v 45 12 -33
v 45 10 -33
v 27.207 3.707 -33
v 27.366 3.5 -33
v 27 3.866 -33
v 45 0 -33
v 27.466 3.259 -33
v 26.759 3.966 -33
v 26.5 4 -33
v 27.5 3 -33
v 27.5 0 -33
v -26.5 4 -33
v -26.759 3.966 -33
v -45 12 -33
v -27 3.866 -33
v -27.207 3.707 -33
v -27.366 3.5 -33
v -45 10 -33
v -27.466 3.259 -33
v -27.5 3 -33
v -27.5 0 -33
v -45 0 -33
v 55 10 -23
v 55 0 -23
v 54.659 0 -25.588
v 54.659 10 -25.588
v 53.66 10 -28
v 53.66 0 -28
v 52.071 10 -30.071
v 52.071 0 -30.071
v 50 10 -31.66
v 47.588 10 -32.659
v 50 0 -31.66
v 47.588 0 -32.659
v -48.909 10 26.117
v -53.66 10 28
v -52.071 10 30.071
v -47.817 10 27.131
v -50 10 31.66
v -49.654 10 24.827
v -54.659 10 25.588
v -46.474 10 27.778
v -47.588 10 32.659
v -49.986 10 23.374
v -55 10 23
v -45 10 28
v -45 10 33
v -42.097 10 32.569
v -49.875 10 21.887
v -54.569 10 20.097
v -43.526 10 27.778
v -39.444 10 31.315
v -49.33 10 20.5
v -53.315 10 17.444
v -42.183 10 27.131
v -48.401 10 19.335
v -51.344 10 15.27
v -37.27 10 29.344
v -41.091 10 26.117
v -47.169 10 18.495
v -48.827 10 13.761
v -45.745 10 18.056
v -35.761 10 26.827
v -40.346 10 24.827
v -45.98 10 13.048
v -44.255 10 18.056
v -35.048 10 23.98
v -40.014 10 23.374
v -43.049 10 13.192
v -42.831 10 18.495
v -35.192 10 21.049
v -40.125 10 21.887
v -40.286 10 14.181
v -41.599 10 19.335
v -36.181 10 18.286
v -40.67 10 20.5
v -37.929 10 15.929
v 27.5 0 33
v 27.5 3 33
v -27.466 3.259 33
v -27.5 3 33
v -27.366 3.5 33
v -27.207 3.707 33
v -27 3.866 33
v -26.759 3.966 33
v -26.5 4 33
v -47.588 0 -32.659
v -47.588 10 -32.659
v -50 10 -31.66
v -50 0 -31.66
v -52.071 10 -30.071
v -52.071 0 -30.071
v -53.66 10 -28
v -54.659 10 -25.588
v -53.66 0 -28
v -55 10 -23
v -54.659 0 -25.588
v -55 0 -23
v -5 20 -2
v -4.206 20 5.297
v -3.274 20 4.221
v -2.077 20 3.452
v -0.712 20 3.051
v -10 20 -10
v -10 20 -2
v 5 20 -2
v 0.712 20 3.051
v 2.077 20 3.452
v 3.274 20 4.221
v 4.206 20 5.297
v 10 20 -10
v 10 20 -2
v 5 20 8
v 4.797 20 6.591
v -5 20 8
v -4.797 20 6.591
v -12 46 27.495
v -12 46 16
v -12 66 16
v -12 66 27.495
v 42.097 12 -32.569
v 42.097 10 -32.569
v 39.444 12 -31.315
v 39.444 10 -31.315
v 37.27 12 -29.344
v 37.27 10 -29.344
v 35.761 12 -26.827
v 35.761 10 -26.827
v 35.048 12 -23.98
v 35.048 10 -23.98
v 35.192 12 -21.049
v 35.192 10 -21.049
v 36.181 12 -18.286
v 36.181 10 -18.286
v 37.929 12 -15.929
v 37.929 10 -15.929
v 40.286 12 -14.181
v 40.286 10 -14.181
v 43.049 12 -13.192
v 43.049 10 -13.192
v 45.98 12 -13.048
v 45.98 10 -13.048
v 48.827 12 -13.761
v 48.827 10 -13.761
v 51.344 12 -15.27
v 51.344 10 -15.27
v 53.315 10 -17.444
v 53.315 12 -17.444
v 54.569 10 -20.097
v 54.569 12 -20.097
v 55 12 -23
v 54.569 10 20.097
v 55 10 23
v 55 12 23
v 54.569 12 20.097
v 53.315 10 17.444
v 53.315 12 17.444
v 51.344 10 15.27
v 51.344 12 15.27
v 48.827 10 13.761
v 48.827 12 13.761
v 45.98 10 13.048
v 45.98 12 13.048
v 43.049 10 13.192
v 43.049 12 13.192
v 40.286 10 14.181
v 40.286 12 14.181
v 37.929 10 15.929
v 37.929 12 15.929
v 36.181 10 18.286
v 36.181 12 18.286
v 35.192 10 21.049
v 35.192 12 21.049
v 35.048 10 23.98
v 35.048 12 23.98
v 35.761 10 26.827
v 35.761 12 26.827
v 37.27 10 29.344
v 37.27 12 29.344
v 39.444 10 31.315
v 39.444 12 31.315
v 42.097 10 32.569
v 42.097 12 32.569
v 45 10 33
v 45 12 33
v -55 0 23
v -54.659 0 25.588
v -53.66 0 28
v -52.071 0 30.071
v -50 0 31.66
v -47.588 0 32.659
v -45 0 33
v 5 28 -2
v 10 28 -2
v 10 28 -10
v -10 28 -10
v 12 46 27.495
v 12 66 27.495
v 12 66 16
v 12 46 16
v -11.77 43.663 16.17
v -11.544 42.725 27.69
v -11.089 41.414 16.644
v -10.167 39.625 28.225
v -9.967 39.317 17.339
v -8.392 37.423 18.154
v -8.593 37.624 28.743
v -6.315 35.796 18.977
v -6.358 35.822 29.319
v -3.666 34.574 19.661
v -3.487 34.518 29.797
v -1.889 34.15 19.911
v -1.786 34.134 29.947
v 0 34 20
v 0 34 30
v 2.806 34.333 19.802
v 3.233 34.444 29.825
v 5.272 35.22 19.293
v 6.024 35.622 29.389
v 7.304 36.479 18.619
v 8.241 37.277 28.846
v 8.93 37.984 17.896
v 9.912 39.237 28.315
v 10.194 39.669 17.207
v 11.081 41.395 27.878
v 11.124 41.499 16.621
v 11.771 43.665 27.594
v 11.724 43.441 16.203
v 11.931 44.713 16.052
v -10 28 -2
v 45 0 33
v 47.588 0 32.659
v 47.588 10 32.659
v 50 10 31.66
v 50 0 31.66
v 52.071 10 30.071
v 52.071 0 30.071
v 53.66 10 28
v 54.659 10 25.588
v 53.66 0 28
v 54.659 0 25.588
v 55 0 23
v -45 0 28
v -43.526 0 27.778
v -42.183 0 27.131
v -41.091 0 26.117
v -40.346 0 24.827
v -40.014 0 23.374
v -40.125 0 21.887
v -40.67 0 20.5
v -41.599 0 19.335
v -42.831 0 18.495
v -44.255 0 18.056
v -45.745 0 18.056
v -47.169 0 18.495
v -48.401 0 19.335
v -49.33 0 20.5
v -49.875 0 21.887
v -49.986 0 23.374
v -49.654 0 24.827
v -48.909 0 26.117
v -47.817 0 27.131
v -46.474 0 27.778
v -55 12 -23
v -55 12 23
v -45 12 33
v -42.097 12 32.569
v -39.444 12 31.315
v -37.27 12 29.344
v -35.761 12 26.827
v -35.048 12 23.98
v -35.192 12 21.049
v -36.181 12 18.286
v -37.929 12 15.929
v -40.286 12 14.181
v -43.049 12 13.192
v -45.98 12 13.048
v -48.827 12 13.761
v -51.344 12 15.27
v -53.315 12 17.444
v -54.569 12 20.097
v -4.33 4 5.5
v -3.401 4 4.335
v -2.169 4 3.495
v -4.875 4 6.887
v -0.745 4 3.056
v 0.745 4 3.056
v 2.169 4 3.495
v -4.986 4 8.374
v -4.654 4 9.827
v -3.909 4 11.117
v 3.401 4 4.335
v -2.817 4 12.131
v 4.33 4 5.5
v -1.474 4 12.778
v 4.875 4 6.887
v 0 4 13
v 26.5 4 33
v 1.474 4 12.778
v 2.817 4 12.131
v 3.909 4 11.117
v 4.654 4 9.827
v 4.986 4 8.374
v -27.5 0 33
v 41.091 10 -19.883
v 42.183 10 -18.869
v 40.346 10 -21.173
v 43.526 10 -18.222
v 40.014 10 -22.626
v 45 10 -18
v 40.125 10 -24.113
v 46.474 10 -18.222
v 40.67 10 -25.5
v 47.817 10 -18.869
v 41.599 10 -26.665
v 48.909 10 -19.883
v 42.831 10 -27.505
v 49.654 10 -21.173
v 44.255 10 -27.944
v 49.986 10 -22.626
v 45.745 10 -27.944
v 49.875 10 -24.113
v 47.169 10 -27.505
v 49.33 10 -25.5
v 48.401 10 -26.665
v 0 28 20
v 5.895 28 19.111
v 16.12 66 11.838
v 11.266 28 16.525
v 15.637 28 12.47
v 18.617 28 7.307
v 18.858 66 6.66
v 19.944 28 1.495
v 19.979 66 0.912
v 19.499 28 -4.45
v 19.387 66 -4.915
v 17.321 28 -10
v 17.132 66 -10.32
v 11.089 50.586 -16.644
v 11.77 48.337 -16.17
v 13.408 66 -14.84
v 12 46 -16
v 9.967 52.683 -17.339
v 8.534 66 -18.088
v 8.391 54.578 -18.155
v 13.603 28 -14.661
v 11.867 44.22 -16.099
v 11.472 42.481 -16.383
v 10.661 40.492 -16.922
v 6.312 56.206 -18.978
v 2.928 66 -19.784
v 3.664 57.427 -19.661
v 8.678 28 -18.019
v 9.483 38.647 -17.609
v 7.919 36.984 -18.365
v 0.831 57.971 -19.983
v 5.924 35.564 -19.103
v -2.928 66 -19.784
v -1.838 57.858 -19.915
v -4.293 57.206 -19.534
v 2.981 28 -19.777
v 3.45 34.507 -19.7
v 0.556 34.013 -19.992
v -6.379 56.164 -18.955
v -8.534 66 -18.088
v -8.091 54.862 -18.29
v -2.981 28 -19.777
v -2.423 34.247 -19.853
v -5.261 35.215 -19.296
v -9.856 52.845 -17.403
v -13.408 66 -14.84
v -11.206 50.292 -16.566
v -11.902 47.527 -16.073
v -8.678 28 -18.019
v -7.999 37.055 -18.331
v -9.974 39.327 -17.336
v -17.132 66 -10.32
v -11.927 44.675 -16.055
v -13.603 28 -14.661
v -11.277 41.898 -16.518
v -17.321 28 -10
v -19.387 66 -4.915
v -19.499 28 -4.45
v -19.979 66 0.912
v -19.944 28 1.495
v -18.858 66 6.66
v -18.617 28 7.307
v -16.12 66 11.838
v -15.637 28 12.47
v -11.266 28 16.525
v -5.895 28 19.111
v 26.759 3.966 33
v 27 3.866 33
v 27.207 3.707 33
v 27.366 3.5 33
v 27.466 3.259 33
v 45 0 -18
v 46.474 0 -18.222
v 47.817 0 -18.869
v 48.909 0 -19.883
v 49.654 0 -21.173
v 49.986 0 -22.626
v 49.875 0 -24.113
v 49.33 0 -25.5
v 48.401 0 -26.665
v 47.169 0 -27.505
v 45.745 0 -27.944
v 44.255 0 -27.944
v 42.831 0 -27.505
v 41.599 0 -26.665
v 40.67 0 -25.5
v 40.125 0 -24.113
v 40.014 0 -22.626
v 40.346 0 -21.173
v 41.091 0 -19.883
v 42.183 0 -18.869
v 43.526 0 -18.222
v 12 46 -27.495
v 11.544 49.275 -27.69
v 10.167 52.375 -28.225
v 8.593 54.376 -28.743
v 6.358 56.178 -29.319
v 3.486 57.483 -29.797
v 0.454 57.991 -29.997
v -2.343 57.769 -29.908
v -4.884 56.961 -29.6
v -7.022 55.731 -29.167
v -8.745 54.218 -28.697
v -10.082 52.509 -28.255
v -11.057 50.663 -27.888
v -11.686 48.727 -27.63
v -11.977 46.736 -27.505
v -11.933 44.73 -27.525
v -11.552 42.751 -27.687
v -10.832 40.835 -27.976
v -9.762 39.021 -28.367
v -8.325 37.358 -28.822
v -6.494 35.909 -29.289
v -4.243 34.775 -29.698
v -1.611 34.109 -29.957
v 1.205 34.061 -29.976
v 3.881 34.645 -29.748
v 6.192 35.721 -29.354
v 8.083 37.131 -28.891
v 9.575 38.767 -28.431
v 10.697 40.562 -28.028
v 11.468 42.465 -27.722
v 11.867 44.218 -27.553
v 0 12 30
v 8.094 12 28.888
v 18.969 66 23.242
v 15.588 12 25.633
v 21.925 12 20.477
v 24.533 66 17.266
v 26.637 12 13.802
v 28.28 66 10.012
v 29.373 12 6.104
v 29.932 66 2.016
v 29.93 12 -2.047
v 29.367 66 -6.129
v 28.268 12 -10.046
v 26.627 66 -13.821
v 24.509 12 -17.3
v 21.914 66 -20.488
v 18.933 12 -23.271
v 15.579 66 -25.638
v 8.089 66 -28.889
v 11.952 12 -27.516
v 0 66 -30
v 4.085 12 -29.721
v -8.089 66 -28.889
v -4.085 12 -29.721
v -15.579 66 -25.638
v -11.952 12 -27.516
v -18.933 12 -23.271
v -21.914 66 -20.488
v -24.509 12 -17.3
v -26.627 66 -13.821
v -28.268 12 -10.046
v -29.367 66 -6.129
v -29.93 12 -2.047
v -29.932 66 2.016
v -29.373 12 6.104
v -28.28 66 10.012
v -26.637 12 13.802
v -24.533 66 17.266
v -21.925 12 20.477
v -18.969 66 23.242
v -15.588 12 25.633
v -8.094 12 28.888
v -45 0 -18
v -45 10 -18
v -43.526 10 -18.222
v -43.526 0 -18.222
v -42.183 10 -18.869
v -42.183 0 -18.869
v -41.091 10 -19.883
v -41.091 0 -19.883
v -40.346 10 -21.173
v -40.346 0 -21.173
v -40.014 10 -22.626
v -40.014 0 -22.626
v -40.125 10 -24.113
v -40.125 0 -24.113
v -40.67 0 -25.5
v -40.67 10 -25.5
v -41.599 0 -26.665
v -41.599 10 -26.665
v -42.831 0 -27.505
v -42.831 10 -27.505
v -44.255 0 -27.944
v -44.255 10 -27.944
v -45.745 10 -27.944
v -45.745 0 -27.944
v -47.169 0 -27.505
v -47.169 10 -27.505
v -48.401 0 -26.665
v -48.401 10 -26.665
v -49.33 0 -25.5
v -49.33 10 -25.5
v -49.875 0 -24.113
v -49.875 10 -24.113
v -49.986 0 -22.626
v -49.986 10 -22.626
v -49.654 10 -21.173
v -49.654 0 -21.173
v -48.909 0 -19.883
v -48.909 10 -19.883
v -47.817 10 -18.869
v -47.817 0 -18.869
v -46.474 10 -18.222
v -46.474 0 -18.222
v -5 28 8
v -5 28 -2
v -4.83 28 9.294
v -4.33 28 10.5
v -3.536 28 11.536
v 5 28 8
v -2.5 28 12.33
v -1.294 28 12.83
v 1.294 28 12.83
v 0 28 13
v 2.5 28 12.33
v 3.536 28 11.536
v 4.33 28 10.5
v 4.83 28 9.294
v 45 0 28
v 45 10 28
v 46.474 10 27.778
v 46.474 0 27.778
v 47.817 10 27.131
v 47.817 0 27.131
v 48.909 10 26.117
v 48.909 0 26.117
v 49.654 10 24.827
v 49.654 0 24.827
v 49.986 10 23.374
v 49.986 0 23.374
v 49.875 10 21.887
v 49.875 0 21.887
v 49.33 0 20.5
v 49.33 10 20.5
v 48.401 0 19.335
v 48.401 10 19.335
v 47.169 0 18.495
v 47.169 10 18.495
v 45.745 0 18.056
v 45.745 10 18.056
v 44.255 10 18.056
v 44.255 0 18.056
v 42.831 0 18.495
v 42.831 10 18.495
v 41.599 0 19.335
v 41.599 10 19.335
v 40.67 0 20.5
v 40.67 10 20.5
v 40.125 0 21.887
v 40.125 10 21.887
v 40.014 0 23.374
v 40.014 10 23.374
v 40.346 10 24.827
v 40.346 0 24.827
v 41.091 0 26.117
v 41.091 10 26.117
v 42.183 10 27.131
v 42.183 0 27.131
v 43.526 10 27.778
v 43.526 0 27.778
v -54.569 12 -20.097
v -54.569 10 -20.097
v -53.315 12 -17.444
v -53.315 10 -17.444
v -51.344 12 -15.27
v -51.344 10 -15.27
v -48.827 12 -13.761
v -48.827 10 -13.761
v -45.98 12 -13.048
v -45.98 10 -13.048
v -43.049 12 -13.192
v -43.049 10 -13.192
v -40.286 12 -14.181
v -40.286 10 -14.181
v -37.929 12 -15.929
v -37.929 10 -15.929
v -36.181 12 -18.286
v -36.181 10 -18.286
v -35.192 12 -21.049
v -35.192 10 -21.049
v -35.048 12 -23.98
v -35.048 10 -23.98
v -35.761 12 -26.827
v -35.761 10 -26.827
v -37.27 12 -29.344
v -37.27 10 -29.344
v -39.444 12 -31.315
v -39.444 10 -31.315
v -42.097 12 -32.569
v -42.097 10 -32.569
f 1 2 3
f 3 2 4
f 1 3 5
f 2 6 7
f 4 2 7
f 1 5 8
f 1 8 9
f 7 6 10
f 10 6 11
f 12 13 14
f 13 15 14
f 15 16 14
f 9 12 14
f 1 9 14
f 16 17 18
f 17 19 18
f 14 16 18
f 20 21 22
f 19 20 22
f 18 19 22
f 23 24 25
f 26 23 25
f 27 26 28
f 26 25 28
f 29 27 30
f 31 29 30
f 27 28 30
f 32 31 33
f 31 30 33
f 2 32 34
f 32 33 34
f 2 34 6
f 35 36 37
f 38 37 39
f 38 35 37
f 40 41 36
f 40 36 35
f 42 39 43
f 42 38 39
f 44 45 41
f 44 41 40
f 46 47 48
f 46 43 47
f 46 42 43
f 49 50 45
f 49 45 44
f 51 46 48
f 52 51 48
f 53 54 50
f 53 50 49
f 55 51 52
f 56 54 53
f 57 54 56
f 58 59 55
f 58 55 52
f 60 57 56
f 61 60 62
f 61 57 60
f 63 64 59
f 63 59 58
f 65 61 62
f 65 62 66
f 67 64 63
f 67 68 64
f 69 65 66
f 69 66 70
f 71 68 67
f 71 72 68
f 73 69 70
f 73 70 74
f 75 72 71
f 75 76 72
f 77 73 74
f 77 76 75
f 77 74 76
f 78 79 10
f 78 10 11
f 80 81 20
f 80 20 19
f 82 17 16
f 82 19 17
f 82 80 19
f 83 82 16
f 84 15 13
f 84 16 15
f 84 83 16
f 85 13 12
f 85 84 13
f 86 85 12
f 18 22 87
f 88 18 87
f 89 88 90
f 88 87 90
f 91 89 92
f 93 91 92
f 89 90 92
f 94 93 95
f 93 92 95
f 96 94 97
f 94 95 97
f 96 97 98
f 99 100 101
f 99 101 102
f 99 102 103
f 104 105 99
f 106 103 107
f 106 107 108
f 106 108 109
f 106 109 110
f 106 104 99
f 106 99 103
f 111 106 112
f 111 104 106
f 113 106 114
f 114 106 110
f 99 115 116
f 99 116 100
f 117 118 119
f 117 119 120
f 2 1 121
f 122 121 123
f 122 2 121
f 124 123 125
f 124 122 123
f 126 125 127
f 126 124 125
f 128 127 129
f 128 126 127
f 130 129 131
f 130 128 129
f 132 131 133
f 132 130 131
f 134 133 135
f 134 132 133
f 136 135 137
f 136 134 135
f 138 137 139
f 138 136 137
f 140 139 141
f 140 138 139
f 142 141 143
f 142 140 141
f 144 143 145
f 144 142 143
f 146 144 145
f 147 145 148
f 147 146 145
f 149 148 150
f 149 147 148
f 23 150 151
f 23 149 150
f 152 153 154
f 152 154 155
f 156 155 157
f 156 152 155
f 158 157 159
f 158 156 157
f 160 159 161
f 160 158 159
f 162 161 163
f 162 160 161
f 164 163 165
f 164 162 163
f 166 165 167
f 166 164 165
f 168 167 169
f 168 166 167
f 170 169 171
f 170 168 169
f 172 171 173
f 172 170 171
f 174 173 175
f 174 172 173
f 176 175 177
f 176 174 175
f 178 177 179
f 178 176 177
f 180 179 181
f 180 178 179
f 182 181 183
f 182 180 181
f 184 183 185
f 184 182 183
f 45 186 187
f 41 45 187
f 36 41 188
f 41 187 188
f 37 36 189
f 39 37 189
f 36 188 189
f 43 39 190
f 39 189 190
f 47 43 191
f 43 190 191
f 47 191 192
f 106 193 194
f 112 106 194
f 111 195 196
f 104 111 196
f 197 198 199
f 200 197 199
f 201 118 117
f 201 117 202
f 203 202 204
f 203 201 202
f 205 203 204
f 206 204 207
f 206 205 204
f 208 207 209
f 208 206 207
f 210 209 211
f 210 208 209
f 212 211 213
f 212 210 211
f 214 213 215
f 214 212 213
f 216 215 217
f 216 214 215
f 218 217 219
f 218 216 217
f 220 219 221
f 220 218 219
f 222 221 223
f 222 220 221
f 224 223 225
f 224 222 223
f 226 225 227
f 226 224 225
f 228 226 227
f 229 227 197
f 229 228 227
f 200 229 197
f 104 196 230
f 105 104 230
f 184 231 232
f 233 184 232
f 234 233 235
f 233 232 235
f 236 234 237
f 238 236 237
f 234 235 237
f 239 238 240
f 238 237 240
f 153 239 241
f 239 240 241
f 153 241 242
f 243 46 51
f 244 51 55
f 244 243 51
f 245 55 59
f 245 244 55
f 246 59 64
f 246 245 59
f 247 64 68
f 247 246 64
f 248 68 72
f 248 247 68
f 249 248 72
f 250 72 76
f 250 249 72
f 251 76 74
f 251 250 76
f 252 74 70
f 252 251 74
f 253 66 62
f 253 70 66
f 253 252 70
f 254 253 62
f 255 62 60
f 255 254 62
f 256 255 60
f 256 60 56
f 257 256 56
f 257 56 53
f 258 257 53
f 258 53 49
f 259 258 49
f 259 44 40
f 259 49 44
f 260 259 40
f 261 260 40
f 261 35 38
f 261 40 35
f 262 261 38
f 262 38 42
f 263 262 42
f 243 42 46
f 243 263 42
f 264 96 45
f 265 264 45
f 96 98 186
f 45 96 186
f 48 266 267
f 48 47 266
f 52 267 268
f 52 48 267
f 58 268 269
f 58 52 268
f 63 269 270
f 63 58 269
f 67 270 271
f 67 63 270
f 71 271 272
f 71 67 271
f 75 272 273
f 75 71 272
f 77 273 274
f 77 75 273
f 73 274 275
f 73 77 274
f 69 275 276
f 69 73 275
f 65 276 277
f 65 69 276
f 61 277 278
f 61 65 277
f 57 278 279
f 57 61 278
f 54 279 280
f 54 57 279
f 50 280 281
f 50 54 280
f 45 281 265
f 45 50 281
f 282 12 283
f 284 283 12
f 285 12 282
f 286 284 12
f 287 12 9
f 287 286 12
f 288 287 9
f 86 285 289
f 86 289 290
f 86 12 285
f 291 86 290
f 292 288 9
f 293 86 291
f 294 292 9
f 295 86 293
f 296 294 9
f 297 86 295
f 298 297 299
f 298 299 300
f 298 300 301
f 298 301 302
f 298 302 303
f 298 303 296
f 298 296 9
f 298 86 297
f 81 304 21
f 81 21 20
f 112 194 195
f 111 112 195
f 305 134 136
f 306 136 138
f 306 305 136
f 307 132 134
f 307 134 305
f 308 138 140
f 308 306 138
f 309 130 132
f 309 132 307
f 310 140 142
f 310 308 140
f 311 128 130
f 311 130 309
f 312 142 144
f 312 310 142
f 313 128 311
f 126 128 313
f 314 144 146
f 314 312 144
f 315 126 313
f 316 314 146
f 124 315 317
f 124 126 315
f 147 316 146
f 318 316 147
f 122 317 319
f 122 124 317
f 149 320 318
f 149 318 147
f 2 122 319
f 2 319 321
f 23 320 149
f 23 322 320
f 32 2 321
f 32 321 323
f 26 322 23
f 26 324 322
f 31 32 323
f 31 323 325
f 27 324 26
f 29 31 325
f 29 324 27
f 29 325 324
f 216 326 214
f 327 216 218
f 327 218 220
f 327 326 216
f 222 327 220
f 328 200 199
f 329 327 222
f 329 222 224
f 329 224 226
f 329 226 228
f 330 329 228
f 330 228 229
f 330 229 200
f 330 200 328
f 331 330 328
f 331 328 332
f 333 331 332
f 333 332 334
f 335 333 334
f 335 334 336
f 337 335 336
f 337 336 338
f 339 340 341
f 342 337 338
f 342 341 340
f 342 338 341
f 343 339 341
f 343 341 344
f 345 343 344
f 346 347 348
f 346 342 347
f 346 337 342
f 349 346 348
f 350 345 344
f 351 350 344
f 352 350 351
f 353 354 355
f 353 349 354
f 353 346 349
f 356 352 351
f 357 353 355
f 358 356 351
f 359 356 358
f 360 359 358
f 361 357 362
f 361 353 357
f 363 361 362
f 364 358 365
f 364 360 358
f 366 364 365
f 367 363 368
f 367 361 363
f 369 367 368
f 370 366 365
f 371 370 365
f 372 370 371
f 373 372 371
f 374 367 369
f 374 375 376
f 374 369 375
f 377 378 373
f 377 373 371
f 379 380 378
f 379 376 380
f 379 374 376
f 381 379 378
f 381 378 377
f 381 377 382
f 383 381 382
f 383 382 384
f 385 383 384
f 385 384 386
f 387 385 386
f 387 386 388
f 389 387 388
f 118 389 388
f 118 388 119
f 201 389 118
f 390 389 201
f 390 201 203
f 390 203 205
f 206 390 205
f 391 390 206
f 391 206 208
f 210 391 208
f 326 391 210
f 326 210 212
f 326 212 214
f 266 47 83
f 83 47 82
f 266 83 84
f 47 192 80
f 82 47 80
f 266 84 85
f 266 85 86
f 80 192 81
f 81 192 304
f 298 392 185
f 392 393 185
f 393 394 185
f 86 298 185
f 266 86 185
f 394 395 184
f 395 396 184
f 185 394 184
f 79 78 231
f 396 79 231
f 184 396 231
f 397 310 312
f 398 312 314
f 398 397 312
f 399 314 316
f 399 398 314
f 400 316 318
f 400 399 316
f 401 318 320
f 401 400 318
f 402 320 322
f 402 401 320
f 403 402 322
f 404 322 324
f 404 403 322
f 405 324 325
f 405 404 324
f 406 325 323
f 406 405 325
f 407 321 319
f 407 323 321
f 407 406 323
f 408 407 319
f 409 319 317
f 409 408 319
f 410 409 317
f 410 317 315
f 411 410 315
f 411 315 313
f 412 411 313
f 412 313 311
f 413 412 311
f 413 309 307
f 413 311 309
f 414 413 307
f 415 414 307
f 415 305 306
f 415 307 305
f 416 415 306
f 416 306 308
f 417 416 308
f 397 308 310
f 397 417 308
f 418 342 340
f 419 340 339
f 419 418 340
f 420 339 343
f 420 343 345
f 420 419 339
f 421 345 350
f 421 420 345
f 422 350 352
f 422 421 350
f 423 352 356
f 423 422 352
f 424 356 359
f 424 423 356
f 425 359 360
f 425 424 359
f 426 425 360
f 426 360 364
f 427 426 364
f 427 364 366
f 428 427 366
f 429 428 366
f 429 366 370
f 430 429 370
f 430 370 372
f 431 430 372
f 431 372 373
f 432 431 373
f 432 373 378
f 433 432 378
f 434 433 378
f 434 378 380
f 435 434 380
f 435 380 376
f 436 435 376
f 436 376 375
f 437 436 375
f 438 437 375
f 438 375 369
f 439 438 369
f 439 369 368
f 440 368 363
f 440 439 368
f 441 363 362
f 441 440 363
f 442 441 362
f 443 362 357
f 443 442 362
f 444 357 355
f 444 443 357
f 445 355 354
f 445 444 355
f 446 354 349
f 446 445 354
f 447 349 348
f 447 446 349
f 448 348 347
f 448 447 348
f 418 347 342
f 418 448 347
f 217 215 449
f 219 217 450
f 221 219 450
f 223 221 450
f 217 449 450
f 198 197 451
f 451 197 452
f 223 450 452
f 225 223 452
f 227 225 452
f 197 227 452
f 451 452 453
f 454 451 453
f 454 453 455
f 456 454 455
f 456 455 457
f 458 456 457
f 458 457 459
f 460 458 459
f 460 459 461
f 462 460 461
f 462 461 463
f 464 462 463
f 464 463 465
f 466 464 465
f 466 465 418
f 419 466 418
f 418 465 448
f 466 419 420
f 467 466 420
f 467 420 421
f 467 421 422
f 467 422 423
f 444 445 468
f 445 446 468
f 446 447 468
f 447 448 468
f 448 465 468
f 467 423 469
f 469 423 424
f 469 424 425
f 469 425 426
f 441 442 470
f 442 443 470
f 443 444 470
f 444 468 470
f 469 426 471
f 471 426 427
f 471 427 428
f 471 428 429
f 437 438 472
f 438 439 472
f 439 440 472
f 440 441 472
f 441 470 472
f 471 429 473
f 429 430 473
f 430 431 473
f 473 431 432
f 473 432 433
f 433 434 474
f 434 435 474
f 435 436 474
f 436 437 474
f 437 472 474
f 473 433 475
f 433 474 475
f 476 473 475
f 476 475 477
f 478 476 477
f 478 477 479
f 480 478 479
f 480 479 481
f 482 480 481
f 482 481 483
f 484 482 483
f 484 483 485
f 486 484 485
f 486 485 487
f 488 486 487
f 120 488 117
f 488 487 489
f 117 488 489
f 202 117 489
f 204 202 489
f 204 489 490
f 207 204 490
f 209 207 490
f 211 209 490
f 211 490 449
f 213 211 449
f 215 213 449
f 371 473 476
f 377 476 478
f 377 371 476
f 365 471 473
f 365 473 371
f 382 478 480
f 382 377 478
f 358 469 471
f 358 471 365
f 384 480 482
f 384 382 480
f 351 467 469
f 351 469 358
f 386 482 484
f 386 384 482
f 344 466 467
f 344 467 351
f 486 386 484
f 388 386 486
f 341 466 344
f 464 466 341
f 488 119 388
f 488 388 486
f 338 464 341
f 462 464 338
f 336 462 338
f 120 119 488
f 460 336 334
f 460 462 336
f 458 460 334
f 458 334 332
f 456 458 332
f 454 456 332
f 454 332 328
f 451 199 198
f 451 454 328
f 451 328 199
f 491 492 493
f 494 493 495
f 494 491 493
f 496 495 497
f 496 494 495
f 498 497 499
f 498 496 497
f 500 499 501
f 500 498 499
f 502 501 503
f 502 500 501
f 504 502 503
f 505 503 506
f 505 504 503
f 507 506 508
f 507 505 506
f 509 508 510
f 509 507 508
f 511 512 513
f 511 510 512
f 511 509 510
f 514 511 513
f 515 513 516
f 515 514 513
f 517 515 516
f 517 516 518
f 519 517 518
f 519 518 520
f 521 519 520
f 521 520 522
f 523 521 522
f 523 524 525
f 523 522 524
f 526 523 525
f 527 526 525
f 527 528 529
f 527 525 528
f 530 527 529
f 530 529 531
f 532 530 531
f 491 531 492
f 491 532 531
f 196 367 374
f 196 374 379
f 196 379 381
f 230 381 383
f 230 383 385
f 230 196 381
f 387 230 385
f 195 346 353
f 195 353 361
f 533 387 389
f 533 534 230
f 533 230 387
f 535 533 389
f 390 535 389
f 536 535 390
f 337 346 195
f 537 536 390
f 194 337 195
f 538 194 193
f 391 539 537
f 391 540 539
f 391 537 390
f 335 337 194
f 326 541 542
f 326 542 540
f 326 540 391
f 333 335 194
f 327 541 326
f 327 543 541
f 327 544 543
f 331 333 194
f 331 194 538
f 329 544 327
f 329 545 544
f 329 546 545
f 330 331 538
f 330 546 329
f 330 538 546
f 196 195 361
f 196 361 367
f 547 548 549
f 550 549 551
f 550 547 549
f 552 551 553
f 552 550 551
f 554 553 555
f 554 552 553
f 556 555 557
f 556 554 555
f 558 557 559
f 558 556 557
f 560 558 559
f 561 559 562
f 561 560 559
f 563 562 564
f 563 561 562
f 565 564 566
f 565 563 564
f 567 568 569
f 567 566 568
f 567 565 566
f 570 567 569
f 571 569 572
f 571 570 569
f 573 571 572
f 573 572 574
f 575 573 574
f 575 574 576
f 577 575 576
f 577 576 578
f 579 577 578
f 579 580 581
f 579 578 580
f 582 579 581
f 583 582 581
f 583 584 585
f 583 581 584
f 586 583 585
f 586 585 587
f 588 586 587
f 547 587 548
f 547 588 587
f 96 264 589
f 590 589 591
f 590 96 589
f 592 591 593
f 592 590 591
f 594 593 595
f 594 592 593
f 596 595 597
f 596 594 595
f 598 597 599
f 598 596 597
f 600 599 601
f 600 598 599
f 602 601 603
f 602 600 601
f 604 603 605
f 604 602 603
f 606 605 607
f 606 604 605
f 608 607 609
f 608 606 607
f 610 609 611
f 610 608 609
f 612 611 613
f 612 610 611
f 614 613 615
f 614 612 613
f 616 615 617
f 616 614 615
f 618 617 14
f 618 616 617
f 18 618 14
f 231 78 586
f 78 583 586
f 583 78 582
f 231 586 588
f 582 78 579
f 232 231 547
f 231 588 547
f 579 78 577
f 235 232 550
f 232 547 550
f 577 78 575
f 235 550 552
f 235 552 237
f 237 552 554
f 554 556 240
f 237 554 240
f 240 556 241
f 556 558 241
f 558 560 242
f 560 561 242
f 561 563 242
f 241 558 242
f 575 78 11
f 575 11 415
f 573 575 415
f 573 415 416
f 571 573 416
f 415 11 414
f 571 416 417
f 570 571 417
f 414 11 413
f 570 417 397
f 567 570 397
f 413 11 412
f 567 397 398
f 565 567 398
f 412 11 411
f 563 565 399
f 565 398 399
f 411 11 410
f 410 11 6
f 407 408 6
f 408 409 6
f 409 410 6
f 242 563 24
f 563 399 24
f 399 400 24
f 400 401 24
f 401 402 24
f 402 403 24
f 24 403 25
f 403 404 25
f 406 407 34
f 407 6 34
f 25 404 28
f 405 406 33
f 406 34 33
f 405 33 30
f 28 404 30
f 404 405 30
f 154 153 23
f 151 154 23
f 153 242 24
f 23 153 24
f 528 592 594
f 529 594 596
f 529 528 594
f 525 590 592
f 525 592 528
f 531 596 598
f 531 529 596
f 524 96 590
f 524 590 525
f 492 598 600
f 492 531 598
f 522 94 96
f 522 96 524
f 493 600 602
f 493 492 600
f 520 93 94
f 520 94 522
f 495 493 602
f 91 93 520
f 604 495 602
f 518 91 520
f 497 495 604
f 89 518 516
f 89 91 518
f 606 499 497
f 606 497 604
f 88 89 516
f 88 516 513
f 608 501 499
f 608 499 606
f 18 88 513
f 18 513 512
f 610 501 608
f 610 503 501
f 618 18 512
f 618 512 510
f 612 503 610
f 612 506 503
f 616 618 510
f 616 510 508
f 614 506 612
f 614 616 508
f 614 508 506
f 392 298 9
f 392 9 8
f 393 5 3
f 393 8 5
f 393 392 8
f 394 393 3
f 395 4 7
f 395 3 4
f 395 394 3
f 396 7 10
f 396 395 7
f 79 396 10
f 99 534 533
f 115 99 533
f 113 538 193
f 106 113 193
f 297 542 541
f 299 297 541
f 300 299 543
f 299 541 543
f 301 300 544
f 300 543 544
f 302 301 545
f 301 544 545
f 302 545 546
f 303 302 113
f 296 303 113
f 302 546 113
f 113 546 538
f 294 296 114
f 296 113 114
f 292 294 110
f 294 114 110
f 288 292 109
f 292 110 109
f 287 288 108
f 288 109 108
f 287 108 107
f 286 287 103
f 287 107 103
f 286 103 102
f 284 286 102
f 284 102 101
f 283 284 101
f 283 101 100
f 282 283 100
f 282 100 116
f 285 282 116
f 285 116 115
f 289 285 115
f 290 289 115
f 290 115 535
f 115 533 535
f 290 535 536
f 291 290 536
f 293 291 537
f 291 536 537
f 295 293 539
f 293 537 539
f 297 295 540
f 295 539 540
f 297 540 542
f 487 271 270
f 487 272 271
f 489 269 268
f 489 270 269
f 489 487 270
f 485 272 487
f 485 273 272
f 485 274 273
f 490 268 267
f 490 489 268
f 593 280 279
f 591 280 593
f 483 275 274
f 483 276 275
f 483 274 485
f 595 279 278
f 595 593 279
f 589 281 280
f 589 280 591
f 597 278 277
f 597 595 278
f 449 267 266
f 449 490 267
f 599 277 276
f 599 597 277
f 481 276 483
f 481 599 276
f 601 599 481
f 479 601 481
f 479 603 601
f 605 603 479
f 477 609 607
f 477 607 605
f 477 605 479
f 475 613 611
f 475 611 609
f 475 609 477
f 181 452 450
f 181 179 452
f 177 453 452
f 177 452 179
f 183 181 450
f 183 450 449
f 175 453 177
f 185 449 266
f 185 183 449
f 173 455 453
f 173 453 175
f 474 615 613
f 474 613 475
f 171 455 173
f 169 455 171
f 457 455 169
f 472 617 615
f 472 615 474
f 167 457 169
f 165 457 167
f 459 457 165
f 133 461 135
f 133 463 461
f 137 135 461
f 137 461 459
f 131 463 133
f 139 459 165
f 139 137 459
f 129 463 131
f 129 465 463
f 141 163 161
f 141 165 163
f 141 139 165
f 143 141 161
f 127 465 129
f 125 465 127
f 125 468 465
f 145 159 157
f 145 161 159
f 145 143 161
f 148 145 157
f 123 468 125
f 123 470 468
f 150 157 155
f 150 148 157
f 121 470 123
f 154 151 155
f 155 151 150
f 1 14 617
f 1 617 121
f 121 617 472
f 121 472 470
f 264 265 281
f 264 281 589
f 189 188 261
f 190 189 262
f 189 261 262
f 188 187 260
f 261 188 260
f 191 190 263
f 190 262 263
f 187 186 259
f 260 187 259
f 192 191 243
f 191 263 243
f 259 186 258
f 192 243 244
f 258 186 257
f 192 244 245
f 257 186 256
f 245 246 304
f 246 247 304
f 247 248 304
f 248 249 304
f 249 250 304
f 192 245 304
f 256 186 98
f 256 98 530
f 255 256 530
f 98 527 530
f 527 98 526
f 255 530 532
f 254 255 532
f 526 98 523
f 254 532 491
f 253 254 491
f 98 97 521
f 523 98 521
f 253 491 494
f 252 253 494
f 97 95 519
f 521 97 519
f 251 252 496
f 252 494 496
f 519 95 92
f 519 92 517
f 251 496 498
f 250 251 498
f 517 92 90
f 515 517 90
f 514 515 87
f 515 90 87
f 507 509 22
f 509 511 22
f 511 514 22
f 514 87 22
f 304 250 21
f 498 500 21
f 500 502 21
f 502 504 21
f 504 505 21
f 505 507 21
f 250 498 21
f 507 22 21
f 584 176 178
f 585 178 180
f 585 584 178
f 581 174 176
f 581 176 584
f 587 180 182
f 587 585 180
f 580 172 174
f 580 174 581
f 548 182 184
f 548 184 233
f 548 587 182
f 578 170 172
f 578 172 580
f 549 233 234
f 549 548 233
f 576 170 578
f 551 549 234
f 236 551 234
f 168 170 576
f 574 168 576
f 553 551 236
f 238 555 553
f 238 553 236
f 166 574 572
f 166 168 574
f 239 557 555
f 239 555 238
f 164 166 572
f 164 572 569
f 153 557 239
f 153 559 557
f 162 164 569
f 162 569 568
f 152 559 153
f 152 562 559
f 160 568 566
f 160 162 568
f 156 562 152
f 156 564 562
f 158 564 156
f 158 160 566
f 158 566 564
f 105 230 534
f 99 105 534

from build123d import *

# Parameters (mm, degrees)
SKETCH_1_R                      = 5
EXTRUDE_1_DEPTH                 = 12
CUT_EXTRUDE_START               = -2
SKETCH_3_R                      = 10
CUT_EXTRUDE_1_DEPTH             = 2
CUT_EXTRUDE_2_DEPTH             = 87.746757864
SKETCH_5_R                      = 30
SKETCH_5_R_2                    = 20
EXTRUDE_2_DEPTH                 = 54
SKETCH_6_R                      = 20
EXTRUDE_3_DEPTH                 = 16
CUT_EXTRUDE_4_DEPTH             = 8
SKETCH_7_3_R                    = 5
CUT_EXTRUDE_5_DEPTH             = 75.551995278
CUT_EXTRUDE_6_DEPTH             = 93.032602919
CUT_EXTRUDE_6_DEPTH_BACK        = 93.032602919
SKETCH_8_R                      = 12
CUT_EXTRUDE_7_REACH             = 94.033
CUT_EXTRUDE_7_END_RADIUS        = 12
CUT_EXTRUDE_7_DIRECTION_2_DEPTH = 93.032602919


with BuildPart() as part:
    # 草图1 → 凸台-拉伸1 (new body)
    with BuildSketch(Plane(origin=(0, 0, 0), x_dir=(1, 0, 0), z_dir=(0, 1, 0))):
        with BuildLine():
            Line((-45, -33), (45, -33))
            ThreePointArc((45, -33), (52.071067812, -30.071067812), (55, -23))
            Line((55, -23), (55, 23))
            ThreePointArc((55, 23), (52.071067812, 30.071067812), (45, 33))
            Line((45, 33), (-45, 33))
            ThreePointArc((-45, 33), (-52.071067812, 30.071067812), (-55, 23))
            Line((-55, 23), (-55, -23))
            ThreePointArc((-55, -23), (-52.071067812, -30.071067812), (-45, -33))
        make_face()
        with Locations(Location((-45, 23, 0), (0, 0, 270))):
            Circle(SKETCH_1_R, mode=Mode.SUBTRACT)
        with Locations(Location((45, 23, 0), (0, 0, 270))):
            Circle(SKETCH_1_R, mode=Mode.SUBTRACT)
        with Locations(Location((45, -23, 0), (0, 0, 270))):
            Circle(SKETCH_1_R, mode=Mode.SUBTRACT)
        with Locations(Location((-45, -23, 0), (0, 0, 270))):
            Circle(SKETCH_1_R, mode=Mode.SUBTRACT)
    extrude(amount=EXTRUDE_1_DEPTH)

    # 草图3 → 切除-拉伸1 (cut)
    with BuildSketch(Plane(origin=(0, 12, 0), x_dir=(1, 0, 0), z_dir=(0, 1, 0)).offset(CUT_EXTRUDE_START)):
        with Locations((-45, 23)):
            Circle(SKETCH_3_R)
        with Locations((-45, -23)):
            Circle(SKETCH_3_R)
        with Locations((45, -23)):
            Circle(SKETCH_3_R)
        with Locations((45, 23)):
            Circle(SKETCH_3_R)
    extrude(amount=CUT_EXTRUDE_1_DEPTH, mode=Mode.SUBTRACT)

    # 草图4 → 切除-拉伸2 (cut, through all)
    with BuildSketch(Plane.XY.offset(33)):
        with BuildLine():
            Line((-27.5, 0), (-27.5, 3))
            ThreePointArc((-27.5, 3), (-27.207106781, 3.707106781), (-26.5, 4))
            Line((-26.5, 4), (26.5, 4))
            ThreePointArc((26.5, 4), (27.207106781, 3.707106781), (27.5, 3))
            Line((27.5, 3), (27.5, 0))
            Line((27.5, 0), (-27.5, 0))
        make_face()
    extrude(amount=-CUT_EXTRUDE_2_DEPTH, mode=Mode.SUBTRACT)

    # 草图5 → 凸台-拉伸2 (add)
    with BuildSketch(Plane(origin=(0, 12, 0), x_dir=(1, 0, 0), z_dir=(0, 1, 0))):
        with Locations(Location((0, 0, 0), (0, 0, 270))):
            Circle(SKETCH_5_R)
        with Locations(Location((0, 0, 0), (0, 0, 270))):
            Circle(SKETCH_5_R_2, mode=Mode.SUBTRACT)
    extrude(amount=EXTRUDE_2_DEPTH)

    # 草图6 → 凸台-拉伸3 (add)
    with BuildSketch(Plane(origin=(0, 12, 0), x_dir=(1, 0, 0), z_dir=(0, 1, 0))):
        with Locations(Location((0, 0, 0), (0, 0, 270))):
            Circle(SKETCH_6_R)
    extrude(amount=EXTRUDE_3_DEPTH)

    # 草图7 → 切除-拉伸4 (cut)
    with BuildSketch(Plane(origin=(0, 28, 0), x_dir=(1, 0, 0), z_dir=(0, 1, 0))):
        with BuildLine():
            Line((5, -8), (5, 2))
            Line((5, 2), (10, 2))
            Line((10, 2), (10, 10))
            Line((10, 10), (-10, 10))
            Line((-10, 10), (-10, 2))
            Line((-10, 2), (-5, 2))
            Line((-5, 2), (-5, -8))
            ThreePointArc((-5, -8), (0, -3), (5, -8))
        make_face()
    extrude(amount=-CUT_EXTRUDE_4_DEPTH, mode=Mode.SUBTRACT)

    # 草图7<3> → 切除-拉伸5 (cut, through all)
    with BuildSketch(Plane(origin=(0, 28, 0), x_dir=(1, 0, 0), z_dir=(0, 1, 0))):
        with Locations(Location((0, -8, 0), (0, 0, 270))):
            Circle(SKETCH_7_3_R)
    extrude(amount=-CUT_EXTRUDE_5_DEPTH, mode=Mode.SUBTRACT)

    # 草图8 → 切除-拉伸6 (cut, two sides: drawn at the far end of the back side and taken through both)
    with BuildSketch(Plane.XY.offset(-CUT_EXTRUDE_6_DEPTH_BACK)):
        with Locations((0, 46)):
            Circle(SKETCH_8_R)
    extrude(amount=CUT_EXTRUDE_6_DEPTH + CUT_EXTRUDE_6_DEPTH_BACK, mode=Mode.SUBTRACT)

    # 切除-拉伸7: up to this cylinder (the profile starts outside it)
    cut_extrude_7_end = Plane(origin=(0, 46, 23.912941), z_dir=(0, 0, 1)) * Cylinder(CUT_EXTRUDE_7_END_RADIUS, 213.066, mode=Mode.PRIVATE)
    # 草图9 → 切除-拉伸7 (cut, up to the surface)
    with BuildSketch(Plane(origin=(0, 66, 0), x_dir=(1, 0, 0), z_dir=(0, 1, 0)), mode=Mode.PRIVATE) as cut_extrude_7_sk1:
        with BuildLine():
            Line((-12, -16), (-12, -27.49545417))
            ThreePointArc((-12, -27.49545417), (0, -30), (12, -27.49545417))
            Line((12, -27.49545417), (12, -16))
            ThreePointArc((12, -16), (0, -20), (-12, -16))
        make_face()
    cut_extrude_7_tool1 = extrude(cut_extrude_7_sk1.sketch, amount=-CUT_EXTRUDE_7_REACH, mode=Mode.PRIVATE) - cut_extrude_7_end
    add(cut_extrude_7_tool1.solids().sort_by_distance((0, 66, 23.912941))[0], mode=Mode.SUBTRACT)

    # 草图9 → 切除-拉伸7 direction 2 (cut)
    with BuildSketch(Plane(origin=(0, 66, 0), x_dir=(1, 0, 0), z_dir=(0, 1, 0))):
        with BuildLine():
            Line((-12, -16), (-12, -27.49545417))
            ThreePointArc((-12, -27.49545417), (0, -30), (12, -27.49545417))
            Line((12, -27.49545417), (12, -16))
            ThreePointArc((12, -16), (0, -20), (-12, -16))
        make_face()
    extrude(amount=CUT_EXTRUDE_7_DIRECTION_2_DEPTH, mode=Mode.SUBTRACT)


solid = part.part
